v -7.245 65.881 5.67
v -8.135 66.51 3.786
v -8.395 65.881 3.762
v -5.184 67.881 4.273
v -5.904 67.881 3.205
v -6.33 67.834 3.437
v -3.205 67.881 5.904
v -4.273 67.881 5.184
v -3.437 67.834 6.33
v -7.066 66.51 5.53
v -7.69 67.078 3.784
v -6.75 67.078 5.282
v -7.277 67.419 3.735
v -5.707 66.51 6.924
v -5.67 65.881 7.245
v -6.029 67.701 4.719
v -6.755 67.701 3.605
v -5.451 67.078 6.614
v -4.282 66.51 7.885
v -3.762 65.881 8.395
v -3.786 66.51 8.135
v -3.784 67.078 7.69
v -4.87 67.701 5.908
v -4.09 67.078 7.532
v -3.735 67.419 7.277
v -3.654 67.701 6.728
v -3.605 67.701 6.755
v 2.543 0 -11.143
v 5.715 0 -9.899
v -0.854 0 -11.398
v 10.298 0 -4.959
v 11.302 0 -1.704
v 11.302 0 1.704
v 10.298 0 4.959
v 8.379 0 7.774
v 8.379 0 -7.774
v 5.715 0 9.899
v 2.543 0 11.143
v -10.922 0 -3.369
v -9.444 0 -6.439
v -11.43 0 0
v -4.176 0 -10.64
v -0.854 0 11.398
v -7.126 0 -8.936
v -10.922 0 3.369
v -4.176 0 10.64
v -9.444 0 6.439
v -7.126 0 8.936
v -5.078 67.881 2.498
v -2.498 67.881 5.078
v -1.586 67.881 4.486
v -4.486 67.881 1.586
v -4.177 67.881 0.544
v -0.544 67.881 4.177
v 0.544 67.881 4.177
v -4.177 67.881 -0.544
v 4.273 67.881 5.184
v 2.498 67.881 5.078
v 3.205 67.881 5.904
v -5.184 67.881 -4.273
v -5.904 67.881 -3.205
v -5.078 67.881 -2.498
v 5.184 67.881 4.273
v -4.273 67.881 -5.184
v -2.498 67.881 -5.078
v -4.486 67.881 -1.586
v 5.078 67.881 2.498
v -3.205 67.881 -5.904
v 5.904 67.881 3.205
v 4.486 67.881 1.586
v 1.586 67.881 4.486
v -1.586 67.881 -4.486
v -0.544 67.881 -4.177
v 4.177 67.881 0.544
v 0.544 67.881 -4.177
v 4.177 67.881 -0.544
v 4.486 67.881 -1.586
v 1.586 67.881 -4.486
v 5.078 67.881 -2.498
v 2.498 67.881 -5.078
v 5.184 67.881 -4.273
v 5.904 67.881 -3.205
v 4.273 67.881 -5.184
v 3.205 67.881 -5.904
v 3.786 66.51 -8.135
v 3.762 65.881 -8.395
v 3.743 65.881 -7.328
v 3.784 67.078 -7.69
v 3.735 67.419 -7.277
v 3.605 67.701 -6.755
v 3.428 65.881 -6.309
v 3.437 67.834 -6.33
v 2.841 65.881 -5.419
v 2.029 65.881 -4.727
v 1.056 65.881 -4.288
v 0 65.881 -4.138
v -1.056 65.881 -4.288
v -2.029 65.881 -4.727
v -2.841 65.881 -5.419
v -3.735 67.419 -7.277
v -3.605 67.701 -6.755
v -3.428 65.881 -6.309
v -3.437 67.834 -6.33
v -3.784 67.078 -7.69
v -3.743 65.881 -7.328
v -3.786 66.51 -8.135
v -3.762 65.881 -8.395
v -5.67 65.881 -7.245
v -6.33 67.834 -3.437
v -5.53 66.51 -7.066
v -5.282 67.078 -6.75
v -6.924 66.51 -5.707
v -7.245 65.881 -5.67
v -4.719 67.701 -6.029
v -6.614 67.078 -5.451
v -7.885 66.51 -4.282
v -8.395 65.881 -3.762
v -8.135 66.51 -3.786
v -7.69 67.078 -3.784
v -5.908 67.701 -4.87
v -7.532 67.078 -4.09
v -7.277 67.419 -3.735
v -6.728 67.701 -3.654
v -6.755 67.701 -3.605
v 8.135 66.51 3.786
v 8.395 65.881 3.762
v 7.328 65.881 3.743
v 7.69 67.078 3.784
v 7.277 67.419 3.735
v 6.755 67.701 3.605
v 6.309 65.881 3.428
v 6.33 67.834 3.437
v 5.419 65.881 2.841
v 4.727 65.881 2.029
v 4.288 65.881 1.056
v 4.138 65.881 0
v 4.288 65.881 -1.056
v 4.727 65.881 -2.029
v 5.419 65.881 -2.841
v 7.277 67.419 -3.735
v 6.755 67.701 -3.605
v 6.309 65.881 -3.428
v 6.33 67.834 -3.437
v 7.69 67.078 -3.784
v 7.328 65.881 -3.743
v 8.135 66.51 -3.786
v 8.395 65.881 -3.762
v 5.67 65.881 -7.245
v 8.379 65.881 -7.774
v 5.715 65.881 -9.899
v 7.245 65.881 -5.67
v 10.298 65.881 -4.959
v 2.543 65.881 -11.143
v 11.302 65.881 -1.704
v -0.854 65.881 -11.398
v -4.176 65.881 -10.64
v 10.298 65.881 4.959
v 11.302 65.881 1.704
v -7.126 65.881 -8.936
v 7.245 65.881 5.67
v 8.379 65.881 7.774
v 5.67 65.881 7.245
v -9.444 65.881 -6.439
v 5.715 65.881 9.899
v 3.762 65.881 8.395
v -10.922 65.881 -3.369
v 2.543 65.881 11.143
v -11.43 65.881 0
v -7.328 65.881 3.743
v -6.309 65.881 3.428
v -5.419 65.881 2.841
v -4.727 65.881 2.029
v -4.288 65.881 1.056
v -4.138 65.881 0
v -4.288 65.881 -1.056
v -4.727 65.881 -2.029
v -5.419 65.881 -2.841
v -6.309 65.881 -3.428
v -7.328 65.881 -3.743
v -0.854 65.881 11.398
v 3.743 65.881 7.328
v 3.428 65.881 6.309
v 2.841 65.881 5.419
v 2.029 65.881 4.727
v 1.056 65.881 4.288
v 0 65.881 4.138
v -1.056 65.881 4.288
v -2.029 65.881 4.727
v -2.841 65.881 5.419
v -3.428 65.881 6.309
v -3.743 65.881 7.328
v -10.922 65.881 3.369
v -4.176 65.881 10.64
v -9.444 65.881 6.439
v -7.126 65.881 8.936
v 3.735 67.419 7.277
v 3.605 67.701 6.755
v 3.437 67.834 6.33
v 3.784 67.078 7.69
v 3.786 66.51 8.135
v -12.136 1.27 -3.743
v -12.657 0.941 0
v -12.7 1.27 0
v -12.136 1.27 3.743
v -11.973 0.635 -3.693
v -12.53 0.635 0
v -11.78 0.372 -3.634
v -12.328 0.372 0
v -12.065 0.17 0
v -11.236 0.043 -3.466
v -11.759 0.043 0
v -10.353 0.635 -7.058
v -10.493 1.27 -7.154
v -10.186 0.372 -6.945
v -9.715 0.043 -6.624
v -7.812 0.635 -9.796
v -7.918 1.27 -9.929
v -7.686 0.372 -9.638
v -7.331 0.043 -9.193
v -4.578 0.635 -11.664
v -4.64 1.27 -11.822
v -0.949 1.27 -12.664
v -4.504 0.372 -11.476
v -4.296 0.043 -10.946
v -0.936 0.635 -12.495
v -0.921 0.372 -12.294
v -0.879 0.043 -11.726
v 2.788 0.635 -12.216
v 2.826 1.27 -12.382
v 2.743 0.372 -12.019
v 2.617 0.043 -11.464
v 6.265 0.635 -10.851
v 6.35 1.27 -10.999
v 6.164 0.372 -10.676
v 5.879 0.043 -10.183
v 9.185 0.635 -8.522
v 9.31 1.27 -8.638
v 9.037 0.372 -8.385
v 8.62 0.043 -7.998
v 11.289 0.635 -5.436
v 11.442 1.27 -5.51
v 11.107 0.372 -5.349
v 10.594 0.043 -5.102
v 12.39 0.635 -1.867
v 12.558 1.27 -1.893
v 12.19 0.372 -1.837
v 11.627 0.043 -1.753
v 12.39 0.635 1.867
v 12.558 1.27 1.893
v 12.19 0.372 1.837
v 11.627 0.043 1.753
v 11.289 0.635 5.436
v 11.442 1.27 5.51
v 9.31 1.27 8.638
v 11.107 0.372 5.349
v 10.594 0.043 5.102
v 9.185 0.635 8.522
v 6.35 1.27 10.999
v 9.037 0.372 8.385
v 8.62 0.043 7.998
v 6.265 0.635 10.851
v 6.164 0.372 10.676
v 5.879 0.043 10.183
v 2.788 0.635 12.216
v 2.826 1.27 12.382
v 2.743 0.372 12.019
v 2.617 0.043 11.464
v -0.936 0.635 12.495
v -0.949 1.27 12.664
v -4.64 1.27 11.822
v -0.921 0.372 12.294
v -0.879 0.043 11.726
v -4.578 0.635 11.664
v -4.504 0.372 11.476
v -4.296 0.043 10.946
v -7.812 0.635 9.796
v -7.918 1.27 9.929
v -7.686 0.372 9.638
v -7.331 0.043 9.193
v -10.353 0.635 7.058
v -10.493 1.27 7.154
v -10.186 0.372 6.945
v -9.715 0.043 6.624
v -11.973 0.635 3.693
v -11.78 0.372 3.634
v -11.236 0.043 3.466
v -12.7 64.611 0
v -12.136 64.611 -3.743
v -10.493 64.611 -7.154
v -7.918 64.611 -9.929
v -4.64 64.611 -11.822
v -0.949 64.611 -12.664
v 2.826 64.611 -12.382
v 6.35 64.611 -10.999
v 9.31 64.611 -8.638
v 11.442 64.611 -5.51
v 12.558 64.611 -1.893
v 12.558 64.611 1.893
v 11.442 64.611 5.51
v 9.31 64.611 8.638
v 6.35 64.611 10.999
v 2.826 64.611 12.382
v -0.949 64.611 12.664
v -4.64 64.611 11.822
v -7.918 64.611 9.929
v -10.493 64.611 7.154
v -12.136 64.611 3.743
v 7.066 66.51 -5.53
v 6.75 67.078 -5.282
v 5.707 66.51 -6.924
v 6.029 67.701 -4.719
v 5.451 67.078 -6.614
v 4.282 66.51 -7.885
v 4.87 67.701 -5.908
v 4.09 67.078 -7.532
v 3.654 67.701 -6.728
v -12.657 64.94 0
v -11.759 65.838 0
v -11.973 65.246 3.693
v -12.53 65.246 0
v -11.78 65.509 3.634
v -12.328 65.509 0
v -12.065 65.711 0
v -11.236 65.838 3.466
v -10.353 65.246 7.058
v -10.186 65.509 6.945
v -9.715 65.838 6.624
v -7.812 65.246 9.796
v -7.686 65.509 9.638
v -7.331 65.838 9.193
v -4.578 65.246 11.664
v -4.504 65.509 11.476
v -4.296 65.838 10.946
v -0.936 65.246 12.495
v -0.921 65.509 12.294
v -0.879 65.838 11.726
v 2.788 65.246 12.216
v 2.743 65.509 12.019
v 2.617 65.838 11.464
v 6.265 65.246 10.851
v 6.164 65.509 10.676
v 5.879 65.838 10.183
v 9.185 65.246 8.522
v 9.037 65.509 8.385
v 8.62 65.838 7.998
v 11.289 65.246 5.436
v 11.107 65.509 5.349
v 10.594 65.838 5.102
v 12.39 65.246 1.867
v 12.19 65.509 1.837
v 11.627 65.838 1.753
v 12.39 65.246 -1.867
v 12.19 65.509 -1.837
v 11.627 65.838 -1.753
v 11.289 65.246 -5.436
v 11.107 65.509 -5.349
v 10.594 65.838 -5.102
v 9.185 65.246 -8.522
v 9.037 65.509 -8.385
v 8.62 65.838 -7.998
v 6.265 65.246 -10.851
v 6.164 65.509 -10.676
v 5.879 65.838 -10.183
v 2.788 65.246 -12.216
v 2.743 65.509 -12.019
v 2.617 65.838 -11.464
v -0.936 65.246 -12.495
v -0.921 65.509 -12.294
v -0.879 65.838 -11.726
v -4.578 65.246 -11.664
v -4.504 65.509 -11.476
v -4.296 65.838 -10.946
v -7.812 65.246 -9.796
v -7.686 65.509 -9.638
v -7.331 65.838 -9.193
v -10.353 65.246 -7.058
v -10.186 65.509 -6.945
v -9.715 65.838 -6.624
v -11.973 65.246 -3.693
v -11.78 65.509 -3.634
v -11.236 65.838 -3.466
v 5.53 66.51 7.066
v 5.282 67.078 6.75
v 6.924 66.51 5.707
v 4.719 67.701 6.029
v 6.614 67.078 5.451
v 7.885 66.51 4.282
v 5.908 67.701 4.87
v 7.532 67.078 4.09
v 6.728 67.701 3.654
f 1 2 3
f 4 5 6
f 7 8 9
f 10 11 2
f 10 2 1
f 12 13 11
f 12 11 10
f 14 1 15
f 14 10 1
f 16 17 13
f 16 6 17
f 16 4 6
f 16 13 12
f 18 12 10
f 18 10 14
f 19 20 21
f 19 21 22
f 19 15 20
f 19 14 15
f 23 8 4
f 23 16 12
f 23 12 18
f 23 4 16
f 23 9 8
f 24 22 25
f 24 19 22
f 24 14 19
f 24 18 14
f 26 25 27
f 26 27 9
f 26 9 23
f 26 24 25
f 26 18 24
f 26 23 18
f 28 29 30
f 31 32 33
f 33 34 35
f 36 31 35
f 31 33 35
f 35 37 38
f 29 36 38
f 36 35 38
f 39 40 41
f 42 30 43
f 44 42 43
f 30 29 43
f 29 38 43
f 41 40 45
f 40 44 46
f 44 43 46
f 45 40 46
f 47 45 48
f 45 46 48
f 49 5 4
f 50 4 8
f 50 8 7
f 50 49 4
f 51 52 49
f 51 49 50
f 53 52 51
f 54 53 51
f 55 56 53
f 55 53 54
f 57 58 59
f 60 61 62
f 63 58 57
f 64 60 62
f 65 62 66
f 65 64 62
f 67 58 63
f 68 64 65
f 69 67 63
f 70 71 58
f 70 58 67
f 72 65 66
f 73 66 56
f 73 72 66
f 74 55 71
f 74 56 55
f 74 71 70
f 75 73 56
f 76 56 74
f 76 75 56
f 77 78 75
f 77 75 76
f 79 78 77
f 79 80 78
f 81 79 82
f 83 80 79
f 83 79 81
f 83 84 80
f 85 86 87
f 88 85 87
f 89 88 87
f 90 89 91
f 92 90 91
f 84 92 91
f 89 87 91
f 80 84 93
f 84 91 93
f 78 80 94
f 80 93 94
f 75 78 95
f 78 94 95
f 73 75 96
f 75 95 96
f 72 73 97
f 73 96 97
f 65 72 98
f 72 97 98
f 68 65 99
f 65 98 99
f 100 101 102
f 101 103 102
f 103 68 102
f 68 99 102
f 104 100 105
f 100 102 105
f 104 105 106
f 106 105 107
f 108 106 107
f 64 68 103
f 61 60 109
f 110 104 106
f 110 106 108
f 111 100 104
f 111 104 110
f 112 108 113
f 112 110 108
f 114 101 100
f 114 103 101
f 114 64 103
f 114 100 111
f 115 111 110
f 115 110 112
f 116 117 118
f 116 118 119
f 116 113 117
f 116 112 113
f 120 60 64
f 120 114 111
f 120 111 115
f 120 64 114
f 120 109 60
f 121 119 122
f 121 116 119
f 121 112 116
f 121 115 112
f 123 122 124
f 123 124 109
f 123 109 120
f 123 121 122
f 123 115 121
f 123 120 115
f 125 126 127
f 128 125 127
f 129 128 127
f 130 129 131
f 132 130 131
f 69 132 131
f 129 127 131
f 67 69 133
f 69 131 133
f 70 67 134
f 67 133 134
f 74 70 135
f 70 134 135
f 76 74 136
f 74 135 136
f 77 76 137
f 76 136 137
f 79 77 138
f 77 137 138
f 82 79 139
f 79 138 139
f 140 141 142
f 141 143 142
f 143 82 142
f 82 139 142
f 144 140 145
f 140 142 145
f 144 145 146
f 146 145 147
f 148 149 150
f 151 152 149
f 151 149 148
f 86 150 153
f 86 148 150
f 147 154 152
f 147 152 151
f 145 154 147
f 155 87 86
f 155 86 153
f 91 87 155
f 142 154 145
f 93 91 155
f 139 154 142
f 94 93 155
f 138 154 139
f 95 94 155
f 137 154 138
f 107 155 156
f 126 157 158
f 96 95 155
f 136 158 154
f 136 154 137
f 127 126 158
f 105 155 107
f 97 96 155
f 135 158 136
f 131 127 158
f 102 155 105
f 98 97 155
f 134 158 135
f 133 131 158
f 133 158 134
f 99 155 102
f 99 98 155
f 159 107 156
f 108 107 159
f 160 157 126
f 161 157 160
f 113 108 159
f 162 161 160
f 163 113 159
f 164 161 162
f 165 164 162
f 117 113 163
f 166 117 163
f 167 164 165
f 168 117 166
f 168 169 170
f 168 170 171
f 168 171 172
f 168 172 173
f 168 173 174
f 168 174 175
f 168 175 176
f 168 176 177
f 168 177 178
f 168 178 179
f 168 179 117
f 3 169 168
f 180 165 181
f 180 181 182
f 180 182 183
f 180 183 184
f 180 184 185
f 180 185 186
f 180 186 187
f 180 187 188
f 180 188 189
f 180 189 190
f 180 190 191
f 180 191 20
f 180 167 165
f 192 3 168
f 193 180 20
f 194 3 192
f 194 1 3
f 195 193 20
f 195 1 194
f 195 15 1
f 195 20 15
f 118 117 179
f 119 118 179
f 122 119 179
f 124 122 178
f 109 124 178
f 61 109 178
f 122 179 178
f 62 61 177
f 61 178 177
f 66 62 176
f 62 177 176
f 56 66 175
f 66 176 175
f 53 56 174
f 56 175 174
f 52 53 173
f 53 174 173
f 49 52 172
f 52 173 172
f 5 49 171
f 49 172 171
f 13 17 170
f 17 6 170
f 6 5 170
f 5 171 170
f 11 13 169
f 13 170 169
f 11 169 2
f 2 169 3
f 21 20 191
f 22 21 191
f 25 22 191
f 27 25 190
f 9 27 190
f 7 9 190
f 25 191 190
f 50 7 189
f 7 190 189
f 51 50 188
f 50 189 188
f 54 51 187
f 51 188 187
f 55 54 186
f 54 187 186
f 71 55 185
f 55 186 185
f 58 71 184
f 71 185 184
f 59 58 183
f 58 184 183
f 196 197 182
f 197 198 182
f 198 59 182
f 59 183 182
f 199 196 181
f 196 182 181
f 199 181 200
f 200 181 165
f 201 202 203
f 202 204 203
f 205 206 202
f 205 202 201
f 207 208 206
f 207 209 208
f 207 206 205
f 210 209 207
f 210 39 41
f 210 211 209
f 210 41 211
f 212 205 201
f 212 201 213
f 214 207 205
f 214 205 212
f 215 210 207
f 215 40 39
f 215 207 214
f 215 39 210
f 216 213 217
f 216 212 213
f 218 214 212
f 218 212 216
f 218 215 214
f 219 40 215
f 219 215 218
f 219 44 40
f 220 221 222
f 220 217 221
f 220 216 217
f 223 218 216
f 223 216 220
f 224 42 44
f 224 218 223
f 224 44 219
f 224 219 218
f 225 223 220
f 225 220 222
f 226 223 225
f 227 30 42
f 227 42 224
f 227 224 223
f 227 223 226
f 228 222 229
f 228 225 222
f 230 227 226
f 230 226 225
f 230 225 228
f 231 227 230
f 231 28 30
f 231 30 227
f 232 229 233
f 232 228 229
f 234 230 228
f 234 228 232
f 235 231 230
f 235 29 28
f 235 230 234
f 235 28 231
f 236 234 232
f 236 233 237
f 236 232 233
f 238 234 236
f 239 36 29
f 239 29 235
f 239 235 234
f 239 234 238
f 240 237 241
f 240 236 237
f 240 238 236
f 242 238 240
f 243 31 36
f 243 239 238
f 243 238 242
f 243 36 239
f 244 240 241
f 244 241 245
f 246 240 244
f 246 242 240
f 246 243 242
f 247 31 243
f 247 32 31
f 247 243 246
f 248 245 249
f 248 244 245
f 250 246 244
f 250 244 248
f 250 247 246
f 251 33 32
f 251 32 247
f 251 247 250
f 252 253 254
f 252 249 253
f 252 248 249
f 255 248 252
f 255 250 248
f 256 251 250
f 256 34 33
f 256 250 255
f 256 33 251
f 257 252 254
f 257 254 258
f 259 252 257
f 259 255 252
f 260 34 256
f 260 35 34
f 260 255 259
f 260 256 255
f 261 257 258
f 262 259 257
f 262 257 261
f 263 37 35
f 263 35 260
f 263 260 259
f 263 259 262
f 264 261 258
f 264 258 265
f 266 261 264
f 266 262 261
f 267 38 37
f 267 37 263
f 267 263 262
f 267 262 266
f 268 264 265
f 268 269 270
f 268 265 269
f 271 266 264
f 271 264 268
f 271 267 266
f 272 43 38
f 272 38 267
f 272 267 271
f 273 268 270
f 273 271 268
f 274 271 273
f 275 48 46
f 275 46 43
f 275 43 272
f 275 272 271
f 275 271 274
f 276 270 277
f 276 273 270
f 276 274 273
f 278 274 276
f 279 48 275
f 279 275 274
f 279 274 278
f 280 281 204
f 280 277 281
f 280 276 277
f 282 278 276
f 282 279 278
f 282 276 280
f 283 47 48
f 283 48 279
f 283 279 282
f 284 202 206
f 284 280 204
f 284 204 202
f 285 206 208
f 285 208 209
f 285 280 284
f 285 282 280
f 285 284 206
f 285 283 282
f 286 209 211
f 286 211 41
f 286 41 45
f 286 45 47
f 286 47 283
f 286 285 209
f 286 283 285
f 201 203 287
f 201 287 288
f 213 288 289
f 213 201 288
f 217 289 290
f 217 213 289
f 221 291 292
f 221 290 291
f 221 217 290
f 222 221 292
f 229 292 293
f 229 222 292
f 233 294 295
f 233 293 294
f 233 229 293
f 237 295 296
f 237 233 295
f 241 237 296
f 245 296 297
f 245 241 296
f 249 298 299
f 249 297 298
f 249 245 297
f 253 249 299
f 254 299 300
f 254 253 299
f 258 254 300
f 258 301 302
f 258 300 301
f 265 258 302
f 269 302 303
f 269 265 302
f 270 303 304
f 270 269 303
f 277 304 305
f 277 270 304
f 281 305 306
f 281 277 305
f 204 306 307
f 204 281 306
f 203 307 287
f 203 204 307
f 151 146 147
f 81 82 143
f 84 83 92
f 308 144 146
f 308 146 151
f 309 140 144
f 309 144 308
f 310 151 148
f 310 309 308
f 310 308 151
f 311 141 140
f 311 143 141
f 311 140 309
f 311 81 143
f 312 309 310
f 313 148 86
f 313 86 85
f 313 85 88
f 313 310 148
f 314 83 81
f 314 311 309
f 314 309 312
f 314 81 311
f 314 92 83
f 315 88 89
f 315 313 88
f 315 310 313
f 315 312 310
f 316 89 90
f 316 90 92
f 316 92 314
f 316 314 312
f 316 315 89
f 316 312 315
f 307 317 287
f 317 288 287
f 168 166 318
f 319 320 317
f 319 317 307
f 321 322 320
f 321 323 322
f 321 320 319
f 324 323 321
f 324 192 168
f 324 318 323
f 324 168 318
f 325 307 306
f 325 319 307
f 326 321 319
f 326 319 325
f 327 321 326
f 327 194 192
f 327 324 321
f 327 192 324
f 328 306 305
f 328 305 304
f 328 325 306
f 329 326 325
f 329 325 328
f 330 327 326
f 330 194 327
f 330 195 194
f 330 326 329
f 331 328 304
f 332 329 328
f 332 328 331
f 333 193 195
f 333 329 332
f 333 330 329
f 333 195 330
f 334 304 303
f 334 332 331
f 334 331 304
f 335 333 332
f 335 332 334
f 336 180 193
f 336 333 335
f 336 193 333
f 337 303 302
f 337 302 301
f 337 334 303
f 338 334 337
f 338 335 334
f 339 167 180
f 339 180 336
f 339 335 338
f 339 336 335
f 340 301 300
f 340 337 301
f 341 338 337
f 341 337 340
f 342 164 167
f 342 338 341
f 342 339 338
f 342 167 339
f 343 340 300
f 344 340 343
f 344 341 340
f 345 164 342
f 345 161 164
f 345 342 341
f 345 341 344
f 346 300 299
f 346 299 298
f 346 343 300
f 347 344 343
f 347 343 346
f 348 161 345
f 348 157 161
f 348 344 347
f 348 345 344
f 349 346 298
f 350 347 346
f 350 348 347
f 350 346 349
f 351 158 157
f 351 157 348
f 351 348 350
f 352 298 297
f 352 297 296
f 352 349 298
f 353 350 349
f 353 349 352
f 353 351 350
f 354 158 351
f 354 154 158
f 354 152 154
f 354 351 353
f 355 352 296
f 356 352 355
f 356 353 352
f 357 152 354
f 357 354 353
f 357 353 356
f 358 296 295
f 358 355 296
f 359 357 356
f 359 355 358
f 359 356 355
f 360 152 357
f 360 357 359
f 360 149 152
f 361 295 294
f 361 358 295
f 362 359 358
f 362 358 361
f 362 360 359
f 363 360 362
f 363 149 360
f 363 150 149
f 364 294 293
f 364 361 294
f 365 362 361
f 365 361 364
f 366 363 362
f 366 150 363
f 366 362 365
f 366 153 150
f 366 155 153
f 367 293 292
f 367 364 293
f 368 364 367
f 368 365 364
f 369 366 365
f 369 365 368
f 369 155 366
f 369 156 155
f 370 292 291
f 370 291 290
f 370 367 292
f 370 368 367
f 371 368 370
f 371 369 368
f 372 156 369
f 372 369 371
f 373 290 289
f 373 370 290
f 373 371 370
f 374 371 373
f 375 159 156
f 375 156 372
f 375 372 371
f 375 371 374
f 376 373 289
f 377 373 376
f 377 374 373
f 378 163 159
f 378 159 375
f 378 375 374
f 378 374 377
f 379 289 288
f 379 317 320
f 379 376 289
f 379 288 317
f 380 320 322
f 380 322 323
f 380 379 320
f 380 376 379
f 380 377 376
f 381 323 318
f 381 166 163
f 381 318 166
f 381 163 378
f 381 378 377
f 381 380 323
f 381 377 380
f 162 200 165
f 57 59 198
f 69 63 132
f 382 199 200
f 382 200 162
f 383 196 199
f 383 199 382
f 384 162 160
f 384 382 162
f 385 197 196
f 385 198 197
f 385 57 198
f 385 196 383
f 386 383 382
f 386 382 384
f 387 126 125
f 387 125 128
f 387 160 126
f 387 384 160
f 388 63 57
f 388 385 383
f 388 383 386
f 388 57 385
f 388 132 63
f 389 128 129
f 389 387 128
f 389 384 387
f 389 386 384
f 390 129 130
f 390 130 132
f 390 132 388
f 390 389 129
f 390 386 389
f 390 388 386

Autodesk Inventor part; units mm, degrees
ref_plane "YZ Plane" through (0, 0, 0) normal (1, 0, 0) x (0, 1, 0)
ref_plane "XZ Plane" through (0, 0, 0) normal (0, 1, 0) x (-1, 0, 0)
ref_plane "XY Plane" through (0, 0, 0) normal (0, 0, 1) x (1, 0, 0)
sketch "Sketch1" plane through (0, 0, 0) normal (0, 1, 0) x (-1, 0, 0)
  circle A0 centre (0, 0) radius 12.7
  dimension "d0" = 25.4
extrude "Extrusion1" add sketch "Sketch1" along normal blind 65.8812
fillet "Fillet1" radius 1.27 2 edges at (12.7, 65.8812, 0) (12.7, 0, 0)
sketch "Sketch2" plane through (0, 65.8812, 0) normal (0, 1, 0) x (1, 0, 0)
  circle A0 centre (0, 0) radius 9.1995
  arc A1 (-8.3949, -3.7625) -> (-8.3949, 3.7625) centre (-7.9295, 0) ccw
  arc A2 (3.7625, -8.3949) -> (-3.7625, -8.3949) centre (0, -7.9295) ccw
  arc A3 (8.3949, 3.7625) -> (8.3949, -3.7625) centre (7.9295, 0) ccw
  arc A4 (-3.7625, 8.3949) -> (3.7625, 8.3949) centre (0, 7.9295) ccw
  circle A5 centre (0, 0) radius 7.9295 construction
  line L0 (-3.7625, -8.3949) -> (3.7625, -8.3949) construction
  line L1 (8.3949, -3.7625) -> (8.3949, 3.7625) construction
  line L2 (3.7625, 8.3949) -> (-3.7625, 8.3949) construction
  line L3 (-8.3949, 3.7625) -> (-8.3949, -3.7625) construction
  point P0 (3.7625, 8.3949)
  point P1 (-3.7625, 8.3949)
  point P2 (-3.7625, -8.3949)
  point P3 (3.7625, -8.3949)
  point P4 (8.3949, -3.7625)
  point P5 (8.3949, 3.7625)
  dimension "d6" = 360
  dimension "d8" = 1.27
extrude "Extrusion2" add sketch "Sketch2" along normal blind 2 contours A3 A0 A2 A1 A4
fillet "Fillet2" radius 2.54 4 edges at (6.5051, 67.8812, 6.5051) (-6.5051, 67.8812, 6.5051) (-6.5051, 67.8812, -6.5051) (6.5051, 67.8812, -6.5051)
properties part number "BigBattery"
